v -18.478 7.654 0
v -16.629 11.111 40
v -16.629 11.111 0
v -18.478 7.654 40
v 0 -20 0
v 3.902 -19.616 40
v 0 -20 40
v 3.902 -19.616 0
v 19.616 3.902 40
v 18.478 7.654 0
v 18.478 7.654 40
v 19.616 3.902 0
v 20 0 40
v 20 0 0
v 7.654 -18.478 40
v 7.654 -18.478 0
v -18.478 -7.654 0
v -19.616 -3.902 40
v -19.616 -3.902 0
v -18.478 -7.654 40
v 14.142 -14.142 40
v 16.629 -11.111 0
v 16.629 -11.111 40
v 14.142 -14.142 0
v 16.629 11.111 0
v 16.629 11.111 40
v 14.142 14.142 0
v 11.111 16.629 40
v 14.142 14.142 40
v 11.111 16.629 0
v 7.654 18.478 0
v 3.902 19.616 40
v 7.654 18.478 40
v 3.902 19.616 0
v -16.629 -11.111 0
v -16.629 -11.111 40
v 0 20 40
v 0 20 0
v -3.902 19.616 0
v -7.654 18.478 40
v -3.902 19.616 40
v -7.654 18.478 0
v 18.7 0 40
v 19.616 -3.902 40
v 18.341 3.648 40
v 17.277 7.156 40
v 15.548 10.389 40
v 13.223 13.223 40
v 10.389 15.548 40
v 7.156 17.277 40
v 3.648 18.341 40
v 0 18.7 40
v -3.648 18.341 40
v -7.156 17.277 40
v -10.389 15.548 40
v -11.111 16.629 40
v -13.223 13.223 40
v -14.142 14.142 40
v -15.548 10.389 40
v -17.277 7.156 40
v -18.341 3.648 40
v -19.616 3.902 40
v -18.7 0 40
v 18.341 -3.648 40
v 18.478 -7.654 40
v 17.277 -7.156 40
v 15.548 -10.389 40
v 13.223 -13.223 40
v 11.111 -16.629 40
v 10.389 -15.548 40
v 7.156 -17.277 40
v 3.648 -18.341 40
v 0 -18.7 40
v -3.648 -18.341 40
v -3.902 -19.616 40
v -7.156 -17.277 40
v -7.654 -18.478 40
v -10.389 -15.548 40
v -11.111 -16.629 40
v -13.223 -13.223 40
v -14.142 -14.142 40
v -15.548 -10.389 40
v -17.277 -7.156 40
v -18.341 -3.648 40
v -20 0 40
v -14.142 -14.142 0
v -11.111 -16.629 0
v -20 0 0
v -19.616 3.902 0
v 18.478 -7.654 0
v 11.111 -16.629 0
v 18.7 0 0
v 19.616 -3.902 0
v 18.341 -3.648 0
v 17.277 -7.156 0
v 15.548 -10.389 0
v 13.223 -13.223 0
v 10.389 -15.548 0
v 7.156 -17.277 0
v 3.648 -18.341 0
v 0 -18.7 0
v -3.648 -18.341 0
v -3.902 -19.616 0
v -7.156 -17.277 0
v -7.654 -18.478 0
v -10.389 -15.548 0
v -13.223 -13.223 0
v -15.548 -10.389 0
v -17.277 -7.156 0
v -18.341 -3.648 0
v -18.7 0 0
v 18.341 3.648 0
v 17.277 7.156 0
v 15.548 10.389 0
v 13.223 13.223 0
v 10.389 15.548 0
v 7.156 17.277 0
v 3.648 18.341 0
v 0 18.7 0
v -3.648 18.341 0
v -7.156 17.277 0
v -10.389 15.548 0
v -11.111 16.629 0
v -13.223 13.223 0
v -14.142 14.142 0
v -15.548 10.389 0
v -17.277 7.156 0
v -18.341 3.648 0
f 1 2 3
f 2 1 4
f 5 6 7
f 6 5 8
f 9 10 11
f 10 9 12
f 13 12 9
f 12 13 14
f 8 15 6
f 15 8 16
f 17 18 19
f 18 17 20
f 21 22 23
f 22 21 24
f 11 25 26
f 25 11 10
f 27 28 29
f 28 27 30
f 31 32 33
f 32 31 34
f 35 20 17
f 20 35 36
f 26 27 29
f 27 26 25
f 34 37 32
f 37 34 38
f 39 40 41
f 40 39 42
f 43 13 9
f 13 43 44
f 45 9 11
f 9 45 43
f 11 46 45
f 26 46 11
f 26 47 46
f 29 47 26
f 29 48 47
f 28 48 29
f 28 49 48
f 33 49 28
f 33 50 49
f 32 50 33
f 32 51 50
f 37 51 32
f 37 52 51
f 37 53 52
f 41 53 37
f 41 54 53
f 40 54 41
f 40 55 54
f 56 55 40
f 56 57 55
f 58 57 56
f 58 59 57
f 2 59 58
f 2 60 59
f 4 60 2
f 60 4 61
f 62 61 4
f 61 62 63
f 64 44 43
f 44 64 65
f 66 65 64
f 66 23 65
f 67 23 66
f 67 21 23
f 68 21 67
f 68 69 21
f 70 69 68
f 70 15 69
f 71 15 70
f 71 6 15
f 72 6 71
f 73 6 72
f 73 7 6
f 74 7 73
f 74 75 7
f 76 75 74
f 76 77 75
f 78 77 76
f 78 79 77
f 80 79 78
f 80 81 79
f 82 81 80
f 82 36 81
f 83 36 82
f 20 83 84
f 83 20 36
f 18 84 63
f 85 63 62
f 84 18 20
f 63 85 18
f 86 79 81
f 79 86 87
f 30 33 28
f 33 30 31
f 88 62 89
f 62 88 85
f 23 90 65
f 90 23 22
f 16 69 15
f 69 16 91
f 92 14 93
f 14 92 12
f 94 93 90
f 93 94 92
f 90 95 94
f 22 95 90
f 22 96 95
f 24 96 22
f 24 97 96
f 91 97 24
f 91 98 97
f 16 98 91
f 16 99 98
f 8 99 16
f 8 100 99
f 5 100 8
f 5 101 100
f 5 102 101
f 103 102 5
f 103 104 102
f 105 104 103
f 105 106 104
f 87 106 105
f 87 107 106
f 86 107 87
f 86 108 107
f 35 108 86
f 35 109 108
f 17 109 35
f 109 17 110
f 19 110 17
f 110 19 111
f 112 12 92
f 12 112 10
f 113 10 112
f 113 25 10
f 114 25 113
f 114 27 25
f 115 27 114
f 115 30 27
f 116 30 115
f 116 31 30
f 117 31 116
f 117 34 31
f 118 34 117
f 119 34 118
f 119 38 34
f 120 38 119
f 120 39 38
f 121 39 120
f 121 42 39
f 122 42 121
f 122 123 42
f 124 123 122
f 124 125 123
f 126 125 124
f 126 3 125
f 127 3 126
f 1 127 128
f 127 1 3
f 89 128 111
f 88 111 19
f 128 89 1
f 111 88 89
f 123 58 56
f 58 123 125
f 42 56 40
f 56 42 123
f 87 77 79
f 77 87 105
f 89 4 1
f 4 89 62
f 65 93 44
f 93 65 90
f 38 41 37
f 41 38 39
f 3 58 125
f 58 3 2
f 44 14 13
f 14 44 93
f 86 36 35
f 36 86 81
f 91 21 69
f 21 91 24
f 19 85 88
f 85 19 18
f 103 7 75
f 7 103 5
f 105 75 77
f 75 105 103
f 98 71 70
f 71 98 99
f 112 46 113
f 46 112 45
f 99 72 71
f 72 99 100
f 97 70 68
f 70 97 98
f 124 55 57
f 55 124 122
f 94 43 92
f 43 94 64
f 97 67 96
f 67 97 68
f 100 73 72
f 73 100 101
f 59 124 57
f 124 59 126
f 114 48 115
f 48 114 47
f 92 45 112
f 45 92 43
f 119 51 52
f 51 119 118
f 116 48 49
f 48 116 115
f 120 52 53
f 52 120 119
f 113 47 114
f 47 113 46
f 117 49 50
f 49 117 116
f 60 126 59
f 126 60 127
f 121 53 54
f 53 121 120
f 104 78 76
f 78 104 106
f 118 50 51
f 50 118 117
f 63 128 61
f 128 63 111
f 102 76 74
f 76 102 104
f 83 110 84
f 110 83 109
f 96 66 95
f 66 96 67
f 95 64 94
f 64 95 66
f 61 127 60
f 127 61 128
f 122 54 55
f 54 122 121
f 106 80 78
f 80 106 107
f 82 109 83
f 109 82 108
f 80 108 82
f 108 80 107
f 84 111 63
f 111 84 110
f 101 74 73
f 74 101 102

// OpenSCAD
$fn = 32;

// ----------------------------------------------------------------------
// Thin tube: 1.3 mm wall
// ----------------------------------------------------------------------

// --- parameters (mm) ---
tube_od = 40;             // outer diameter
tube_h = 40;              // height, Z
wall = 1.3;               // wall thickness

difference() {
  cylinder(h = tube_h, d = tube_od);
  translate([0, 0, -1]) cylinder(h = tube_h + 2, d = tube_od - 2 * wall);
}
